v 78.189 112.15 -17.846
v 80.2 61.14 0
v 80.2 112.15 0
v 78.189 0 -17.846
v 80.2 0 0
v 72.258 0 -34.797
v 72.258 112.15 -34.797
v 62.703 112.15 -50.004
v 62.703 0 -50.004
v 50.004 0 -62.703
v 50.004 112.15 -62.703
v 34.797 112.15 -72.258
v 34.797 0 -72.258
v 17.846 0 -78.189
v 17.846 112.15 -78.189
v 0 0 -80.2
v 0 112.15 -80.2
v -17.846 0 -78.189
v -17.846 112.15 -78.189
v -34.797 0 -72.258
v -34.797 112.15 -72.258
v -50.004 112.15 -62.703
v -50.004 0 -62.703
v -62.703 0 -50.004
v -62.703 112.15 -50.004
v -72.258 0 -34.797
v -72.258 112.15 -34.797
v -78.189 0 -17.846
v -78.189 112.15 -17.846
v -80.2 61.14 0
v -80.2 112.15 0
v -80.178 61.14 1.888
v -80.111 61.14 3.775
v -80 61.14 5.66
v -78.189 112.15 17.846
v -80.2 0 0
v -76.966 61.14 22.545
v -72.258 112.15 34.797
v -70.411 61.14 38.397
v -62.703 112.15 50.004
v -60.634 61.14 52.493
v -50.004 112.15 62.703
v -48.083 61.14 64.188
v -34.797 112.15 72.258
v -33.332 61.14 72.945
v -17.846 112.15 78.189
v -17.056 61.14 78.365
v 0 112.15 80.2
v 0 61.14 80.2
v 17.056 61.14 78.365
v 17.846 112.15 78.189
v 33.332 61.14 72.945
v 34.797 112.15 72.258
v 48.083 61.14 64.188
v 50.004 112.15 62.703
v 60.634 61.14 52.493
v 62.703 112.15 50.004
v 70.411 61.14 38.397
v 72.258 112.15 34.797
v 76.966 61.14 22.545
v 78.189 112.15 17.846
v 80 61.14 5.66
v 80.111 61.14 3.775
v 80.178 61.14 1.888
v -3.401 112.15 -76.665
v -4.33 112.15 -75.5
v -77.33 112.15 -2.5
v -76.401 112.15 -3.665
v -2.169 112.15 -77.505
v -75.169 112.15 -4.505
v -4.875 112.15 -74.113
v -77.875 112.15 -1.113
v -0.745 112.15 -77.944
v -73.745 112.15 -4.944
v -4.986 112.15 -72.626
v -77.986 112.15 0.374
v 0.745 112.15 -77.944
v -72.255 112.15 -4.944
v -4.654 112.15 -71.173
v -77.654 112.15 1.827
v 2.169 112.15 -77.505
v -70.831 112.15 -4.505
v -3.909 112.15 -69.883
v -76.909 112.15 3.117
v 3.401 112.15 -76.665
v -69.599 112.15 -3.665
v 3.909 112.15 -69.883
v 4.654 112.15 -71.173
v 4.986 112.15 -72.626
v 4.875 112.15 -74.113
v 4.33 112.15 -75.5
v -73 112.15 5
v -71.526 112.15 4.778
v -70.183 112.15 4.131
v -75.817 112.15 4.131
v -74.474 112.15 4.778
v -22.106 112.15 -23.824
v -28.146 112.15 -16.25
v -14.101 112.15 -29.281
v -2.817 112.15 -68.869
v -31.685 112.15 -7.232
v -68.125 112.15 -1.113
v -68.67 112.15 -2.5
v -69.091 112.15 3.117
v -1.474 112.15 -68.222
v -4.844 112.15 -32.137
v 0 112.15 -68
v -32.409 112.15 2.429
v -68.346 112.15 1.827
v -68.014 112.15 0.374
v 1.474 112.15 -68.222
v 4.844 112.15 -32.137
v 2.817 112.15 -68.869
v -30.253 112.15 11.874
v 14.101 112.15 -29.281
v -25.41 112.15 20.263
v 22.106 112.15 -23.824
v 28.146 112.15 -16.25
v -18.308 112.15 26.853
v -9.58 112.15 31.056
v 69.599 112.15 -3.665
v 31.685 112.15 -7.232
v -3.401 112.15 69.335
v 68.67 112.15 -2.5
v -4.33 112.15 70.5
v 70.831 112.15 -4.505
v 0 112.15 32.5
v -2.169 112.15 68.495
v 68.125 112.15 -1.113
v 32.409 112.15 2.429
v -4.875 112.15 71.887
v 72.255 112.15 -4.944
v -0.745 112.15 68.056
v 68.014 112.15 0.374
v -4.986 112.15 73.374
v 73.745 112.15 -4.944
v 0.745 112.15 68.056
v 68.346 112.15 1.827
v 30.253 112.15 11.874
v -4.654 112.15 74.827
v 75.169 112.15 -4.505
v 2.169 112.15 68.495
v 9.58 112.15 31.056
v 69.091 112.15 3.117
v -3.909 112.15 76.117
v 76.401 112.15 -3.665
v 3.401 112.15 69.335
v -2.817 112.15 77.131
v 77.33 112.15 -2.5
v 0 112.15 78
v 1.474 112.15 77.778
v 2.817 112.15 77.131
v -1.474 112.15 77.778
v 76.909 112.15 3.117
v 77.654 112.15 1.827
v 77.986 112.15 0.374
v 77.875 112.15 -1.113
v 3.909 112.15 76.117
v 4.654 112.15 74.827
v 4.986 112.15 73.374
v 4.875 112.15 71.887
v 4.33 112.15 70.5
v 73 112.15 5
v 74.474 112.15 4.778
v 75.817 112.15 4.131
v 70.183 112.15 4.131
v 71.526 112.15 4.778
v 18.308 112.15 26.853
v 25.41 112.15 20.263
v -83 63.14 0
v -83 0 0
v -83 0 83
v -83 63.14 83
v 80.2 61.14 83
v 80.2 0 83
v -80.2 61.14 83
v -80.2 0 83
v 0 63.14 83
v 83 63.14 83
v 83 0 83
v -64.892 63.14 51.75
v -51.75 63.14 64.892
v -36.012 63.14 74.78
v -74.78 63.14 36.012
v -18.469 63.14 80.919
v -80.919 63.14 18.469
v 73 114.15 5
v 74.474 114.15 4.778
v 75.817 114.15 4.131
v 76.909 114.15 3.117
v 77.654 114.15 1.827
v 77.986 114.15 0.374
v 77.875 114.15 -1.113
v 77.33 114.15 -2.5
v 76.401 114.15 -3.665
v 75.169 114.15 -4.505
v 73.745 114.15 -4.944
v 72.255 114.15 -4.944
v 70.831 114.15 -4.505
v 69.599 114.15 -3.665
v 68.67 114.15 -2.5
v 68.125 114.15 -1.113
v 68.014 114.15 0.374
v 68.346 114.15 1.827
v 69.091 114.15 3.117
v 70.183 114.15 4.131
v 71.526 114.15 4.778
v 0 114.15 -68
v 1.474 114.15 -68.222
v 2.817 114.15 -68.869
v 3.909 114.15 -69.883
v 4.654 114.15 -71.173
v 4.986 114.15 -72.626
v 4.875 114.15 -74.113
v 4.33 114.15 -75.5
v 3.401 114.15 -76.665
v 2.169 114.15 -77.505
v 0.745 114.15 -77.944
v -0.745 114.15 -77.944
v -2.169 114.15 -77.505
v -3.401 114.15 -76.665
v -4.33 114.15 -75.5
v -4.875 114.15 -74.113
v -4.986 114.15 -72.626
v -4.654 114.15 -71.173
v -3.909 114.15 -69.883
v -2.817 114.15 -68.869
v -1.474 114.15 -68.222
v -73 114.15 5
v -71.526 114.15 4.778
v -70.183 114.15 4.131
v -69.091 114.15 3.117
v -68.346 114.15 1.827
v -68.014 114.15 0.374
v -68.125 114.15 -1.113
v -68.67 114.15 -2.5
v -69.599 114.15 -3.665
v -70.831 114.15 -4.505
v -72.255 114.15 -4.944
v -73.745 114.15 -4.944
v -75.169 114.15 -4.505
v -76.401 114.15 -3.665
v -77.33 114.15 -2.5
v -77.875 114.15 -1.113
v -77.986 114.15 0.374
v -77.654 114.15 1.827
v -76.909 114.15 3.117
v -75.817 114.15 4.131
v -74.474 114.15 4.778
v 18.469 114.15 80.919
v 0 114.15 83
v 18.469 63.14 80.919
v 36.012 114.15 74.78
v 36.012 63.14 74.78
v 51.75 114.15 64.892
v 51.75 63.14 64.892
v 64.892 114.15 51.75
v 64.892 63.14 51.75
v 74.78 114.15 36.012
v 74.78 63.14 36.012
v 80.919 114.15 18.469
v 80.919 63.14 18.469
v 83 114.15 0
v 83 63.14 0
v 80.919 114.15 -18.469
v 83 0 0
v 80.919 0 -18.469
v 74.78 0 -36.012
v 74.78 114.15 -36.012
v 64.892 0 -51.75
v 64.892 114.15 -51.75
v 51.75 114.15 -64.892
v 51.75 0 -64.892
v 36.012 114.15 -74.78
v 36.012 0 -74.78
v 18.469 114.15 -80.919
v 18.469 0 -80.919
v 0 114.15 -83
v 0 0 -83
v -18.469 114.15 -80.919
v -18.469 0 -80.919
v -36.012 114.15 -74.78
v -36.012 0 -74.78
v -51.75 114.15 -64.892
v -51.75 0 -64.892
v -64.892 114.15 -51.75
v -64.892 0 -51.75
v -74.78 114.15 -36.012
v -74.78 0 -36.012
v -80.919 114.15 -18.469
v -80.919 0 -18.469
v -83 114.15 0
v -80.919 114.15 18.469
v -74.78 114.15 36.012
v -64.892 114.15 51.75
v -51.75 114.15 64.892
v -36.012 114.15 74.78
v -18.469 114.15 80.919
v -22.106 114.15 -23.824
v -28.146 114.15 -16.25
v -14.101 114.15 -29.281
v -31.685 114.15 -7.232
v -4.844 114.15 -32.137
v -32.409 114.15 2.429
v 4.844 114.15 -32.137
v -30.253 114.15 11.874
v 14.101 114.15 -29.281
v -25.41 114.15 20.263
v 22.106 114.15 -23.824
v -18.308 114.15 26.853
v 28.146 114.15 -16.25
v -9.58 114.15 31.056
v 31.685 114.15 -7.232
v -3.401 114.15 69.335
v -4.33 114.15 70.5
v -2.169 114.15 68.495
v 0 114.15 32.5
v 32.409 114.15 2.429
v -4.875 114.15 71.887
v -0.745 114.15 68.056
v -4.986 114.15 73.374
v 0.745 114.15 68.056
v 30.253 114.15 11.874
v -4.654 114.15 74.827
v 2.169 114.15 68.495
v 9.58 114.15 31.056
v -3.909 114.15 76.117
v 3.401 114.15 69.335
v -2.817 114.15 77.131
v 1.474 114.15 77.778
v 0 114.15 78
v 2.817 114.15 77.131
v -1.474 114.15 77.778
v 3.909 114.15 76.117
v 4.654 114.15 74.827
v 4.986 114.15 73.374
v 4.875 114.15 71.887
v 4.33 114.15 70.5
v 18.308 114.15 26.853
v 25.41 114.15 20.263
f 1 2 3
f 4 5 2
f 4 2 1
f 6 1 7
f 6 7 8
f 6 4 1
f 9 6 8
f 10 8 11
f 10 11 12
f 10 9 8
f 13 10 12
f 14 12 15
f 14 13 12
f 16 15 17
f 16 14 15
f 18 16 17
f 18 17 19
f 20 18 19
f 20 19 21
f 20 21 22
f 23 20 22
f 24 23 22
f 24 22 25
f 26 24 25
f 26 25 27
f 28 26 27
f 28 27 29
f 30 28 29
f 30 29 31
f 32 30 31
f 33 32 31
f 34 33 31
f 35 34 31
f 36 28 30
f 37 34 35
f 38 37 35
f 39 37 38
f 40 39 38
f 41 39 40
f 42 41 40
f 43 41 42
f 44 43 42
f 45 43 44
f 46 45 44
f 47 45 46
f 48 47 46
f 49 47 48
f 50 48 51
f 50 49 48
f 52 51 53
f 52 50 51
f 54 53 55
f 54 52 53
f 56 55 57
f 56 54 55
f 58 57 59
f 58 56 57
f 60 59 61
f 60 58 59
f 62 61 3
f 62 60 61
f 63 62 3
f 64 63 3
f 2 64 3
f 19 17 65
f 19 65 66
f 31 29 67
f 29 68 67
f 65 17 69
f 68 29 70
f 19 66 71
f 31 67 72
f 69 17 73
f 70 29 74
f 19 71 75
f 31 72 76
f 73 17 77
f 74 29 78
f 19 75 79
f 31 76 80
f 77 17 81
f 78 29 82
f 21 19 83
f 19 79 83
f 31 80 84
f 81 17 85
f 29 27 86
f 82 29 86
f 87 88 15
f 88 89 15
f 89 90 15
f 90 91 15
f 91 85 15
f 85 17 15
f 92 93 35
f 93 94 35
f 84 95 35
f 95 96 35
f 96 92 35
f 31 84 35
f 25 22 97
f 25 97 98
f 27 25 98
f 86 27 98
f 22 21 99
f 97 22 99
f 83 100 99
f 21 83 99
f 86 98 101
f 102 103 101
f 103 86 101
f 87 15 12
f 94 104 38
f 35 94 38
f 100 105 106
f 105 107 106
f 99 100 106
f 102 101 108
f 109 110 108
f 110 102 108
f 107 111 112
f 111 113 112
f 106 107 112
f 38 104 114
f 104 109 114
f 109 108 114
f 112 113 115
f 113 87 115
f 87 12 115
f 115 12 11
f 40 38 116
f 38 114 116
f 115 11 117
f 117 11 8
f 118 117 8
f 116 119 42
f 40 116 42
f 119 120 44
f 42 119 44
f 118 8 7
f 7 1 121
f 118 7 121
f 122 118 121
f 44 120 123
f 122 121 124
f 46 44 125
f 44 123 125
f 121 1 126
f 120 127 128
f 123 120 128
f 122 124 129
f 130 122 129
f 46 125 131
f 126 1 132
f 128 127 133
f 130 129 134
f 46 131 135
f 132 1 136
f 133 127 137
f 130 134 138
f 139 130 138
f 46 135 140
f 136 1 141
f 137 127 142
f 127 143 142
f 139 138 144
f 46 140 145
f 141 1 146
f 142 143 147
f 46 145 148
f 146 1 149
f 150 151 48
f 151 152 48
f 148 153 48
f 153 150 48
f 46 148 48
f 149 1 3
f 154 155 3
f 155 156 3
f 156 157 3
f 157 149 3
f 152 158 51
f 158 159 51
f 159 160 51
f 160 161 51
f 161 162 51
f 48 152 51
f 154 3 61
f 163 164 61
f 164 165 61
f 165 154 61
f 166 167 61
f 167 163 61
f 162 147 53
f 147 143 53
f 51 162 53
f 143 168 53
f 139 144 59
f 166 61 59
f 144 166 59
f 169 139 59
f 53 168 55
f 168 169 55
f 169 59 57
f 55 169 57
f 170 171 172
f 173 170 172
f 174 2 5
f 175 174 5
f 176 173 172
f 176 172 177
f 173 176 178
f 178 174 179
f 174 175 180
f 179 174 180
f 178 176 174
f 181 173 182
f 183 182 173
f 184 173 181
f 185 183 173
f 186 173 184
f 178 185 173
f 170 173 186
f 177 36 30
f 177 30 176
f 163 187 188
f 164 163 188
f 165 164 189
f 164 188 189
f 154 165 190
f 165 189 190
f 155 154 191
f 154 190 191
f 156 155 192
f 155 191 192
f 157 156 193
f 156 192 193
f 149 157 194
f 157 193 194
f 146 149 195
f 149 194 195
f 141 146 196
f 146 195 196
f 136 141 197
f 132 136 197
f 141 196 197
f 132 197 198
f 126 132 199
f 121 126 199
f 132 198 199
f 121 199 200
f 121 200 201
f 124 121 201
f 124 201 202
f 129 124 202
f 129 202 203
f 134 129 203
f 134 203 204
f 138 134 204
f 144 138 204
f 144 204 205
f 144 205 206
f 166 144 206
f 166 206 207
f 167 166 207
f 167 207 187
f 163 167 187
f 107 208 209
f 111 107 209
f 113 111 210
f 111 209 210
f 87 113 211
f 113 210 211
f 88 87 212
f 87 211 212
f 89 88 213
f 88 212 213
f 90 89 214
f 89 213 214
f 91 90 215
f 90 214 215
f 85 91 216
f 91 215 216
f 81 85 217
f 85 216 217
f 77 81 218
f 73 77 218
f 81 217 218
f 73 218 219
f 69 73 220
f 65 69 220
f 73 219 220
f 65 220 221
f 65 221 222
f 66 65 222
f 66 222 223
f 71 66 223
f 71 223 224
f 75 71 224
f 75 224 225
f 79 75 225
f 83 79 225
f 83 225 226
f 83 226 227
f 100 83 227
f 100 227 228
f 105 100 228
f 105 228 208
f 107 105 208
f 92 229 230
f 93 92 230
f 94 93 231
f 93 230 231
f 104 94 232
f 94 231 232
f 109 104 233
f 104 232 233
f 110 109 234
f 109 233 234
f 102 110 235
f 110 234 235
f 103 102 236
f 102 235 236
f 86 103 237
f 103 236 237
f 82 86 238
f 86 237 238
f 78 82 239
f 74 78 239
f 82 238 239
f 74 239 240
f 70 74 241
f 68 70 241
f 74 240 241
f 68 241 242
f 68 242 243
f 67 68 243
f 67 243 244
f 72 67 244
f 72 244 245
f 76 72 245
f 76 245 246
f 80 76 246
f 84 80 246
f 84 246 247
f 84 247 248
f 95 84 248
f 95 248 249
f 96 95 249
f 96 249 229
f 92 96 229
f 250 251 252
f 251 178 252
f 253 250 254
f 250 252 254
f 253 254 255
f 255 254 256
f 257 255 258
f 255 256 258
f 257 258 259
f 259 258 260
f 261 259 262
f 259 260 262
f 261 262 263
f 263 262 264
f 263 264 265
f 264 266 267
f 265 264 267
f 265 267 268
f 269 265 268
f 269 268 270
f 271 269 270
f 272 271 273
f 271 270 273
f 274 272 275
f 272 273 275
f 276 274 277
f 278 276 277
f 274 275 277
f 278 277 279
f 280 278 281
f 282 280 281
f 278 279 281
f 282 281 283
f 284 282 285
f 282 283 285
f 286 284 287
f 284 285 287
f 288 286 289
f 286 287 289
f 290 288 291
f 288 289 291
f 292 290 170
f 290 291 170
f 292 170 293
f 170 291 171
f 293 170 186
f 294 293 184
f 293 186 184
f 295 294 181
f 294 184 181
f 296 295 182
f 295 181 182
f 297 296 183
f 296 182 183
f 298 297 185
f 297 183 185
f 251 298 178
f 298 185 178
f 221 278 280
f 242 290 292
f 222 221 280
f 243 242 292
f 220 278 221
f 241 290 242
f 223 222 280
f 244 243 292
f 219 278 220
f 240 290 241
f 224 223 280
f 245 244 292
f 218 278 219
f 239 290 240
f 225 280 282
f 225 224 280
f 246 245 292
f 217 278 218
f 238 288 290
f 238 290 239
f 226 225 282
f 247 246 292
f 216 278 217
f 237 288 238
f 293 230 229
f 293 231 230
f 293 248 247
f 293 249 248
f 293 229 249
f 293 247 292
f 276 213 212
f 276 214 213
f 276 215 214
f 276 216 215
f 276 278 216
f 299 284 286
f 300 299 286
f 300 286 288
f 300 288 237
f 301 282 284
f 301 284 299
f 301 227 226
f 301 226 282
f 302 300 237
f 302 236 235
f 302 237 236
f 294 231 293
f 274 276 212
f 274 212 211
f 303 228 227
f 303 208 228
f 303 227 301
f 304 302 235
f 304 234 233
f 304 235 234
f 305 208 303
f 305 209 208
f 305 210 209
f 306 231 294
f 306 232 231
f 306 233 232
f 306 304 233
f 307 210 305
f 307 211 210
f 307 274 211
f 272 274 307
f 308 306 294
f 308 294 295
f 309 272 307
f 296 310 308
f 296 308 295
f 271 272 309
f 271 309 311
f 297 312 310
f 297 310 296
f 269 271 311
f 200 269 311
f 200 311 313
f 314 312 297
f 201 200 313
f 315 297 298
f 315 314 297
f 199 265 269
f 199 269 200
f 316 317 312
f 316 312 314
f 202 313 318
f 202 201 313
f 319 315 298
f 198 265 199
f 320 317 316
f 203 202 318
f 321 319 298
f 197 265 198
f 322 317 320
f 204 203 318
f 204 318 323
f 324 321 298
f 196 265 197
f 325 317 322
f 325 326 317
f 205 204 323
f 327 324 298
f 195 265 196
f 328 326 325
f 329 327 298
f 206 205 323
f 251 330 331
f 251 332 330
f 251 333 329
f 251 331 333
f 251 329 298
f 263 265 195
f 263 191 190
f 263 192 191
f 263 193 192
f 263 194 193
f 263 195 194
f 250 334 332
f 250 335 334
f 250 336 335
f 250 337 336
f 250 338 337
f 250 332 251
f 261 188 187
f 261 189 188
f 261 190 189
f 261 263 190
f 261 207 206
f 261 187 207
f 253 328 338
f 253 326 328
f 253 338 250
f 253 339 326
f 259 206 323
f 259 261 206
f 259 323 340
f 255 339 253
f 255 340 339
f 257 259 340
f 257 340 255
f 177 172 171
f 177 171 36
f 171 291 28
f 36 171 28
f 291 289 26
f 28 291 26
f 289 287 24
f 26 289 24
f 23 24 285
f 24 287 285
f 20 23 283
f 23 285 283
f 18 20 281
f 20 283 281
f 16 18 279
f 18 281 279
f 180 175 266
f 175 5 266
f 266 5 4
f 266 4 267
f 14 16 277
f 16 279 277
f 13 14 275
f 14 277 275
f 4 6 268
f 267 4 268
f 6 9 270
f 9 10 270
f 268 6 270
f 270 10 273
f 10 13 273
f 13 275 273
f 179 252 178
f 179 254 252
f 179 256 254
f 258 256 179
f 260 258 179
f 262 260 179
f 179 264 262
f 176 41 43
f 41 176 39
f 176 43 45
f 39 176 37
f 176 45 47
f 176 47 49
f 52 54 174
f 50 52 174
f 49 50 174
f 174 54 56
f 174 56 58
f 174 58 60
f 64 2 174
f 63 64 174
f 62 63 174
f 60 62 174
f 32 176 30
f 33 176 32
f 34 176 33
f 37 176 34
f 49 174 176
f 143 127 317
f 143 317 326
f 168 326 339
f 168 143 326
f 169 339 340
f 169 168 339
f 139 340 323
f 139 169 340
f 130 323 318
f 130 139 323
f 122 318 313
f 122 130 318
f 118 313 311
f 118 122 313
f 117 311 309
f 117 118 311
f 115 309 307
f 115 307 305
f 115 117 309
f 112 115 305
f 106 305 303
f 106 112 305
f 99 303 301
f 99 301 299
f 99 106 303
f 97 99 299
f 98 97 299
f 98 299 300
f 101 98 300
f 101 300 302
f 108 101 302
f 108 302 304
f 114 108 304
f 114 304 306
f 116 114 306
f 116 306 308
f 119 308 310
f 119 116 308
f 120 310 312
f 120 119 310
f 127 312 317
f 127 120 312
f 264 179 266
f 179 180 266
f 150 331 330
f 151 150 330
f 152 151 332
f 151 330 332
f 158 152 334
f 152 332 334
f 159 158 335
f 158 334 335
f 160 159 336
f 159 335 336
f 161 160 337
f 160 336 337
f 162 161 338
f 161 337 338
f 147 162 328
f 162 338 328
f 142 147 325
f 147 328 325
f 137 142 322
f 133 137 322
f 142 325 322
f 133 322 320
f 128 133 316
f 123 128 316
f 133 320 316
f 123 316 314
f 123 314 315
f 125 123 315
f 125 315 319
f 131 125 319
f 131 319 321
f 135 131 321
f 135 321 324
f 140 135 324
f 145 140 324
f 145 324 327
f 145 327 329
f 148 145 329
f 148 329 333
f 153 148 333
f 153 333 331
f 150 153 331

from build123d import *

# Parameters (mm, degrees)
BOSS_EXTRUDE1_DEPTH      = 61.14
SKETCH2_R                = 80
BOSS_EXTRUDE2_DEPTH      = 2
SKETCH3_R                = 83
SKETCH3_R_2              = 80
BOSS_EXTRUDE3_DEPTH      = 49.01
SKETCH6_R                = 83
SKETCH6_R_2              = 32.5
BOSS_EXTRUDE4_DEPTH      = 2
MOVE_START               = -80.2
MOVE_FACE1_OUTLINE_W     = 61.14
MOVE_FACE1_OUTLINE_H     = 0.2
MOVE_FACE1_DEPTH         = 160.4
MOVE_FACE1_2_OUTLINE_R   = 80.2
MOVE_FACE1_2_OUTLINE_R_2 = 80
MOVE_FACE1_2_DEPTH       = 112.15
MOVE_FACE1_3_DEPTH       = 61.14
SKETCH7_R                = 5
CUT_EXTRUDE1_DEPTH       = 164.732166968
CUT_EXTRUDE2_DEPTH       = 216.762514121


with BuildPart() as part:
    # Sketch1 → Boss-Extrude1 (new body)
    with BuildSketch(Plane(origin=(0, 0, 0), x_dir=(1, 0, 0), z_dir=(0, 1, 0))):
        with BuildLine():
            Line((0, -83), (83, -83))
            Line((83, -83), (83, 0))
            ThreePointArc((83, 0), (0, 83), (-83, 0))
            Line((-83, 0), (-83, -83))
            Line((-83, -83), (0, -83))
        make_face()
        with BuildLine():
            Line((-80, 0), (-80, -80))
            Line((-80, -80), (0, -80))
            Line((0, -80), (80, -80))
            Line((80, -80), (80, 0))
            ThreePointArc((80, 0), (0, 80), (-80, 0))
        make_face(mode=Mode.SUBTRACT)
    extrude(amount=BOSS_EXTRUDE1_DEPTH)

    # Sketch2 → Boss-Extrude2 (add)
    with BuildSketch(Plane(origin=(0, 61.14, 0), x_dir=(1, 0, 0), z_dir=(0, 1, 0))):
        with BuildLine():
            Line((-83, -83), (83, -83))
            Line((83, -83), (83, 0))
            ThreePointArc((83, 0), (0, 83), (-83, 0))
            Line((-83, 0), (-83, -83))
        make_face()
        with Locations(Location((0, 0, 0), (0, 0, 270))):
            Circle(SKETCH2_R, mode=Mode.SUBTRACT)
    extrude(amount=BOSS_EXTRUDE2_DEPTH)

    # Sketch3 → Boss-Extrude3 (add)
    with BuildSketch(Plane(origin=(0, 63.14, 0), x_dir=(1, 0, 0), z_dir=(0, 1, 0))):
        with Locations(Location((0, 0, 0), (0, 0, 270))):
            Circle(SKETCH3_R)
        with Locations(Location((0, 0, 0), (0, 0, 270))):
            Circle(SKETCH3_R_2, mode=Mode.SUBTRACT)
    extrude(amount=BOSS_EXTRUDE3_DEPTH)

    # Sketch6 → Boss-Extrude4 (add)
    with BuildSketch(Plane(origin=(0, 112.15, 0), x_dir=(1, 0, 0), z_dir=(0, 1, 0))):
        with Locations(Location((0, 0, 0), (0, 0, 270))):
            Circle(SKETCH6_R)
        with Locations(Location((0, 0, 0), (0, 0, 270))):
            Circle(SKETCH6_R_2, mode=Mode.SUBTRACT)
    extrude(amount=BOSS_EXTRUDE4_DEPTH)

    # Move Face1: read off the stored shape, not the designer's step
    # Move Face1 outline → Move Face1 (cut)
    with BuildSketch(Plane.YZ.offset(MOVE_START)):
        with Locations((30.57, 80.1)):
            Rectangle(MOVE_FACE1_OUTLINE_W, MOVE_FACE1_OUTLINE_H)
    extrude(amount=MOVE_FACE1_DEPTH, mode=Mode.SUBTRACT)

    # Move Face1 2 outline → Move Face1 2 (cut)
    with BuildSketch(Plane(origin=(0, 0, 0), x_dir=(1, 0, 0), z_dir=(0, 1, 0))):
        Circle(MOVE_FACE1_2_OUTLINE_R)
        Circle(MOVE_FACE1_2_OUTLINE_R_2, mode=Mode.SUBTRACT)
    extrude(amount=MOVE_FACE1_2_DEPTH, mode=Mode.SUBTRACT)

    # Move Face1 3 outline → Move Face1 3 (cut)
    with BuildSketch(Plane(origin=(0, 0, 0), x_dir=(1, 0, 0), z_dir=(0, 1, 0))):
        with BuildLine():
            Line((80.2, -80), (80.2, 0))
            ThreePointArc((80.2, 0), (80.149984404, -2.831960452), (80, -5.660388679))
            Line((80, -5.660388679), (80, -80))
            Line((80, -80), (80.2, -80))
        make_face()
        with BuildLine():
            ThreePointArc((-80, -5.660388679), (-80.149984404, -2.831960452), (-80.2, 0))
            Line((-80.2, 0), (-80.2, -80))
            Line((-80.2, -80), (-80, -80))
            Line((-80, -80), (-80, -5.660388679))
        make_face()
    extrude(amount=MOVE_FACE1_3_DEPTH, mode=Mode.SUBTRACT)

    # Sketch7 → Cut-Extrude1 (cut, through all)
    with BuildSketch(Plane(origin=(0, 114.15, 0), x_dir=(1, 0, 0), z_dir=(0, 1, 0))):
        with Locations(Location((0, 73, 0), (0, 0, 270))):
            Circle(SKETCH7_R)
        with Locations(Location((73, 0, 0), (0, 0, 270))):
            Circle(SKETCH7_R)
        with Locations(Location((0, -73, 0), (0, 0, 270))):
            Circle(SKETCH7_R)
        with Locations(Location((-73, 0, 0), (0, 0, 270))):
            Circle(SKETCH7_R)
    extrude(amount=-CUT_EXTRUDE1_DEPTH, mode=Mode.SUBTRACT)

    # Sketch8 → Cut-Extrude2 (cut, through all)
    with BuildSketch(Plane(origin=(0, 0, 80.2), x_dir=(-1, 0, 0), z_dir=(0, 0, -1))):
        Polygon((-80.2, 0), (80.2, 0), (80.2, 61.14), (0, 61.14), (-80.2, 61.14), align=None)
    extrude(amount=-CUT_EXTRUDE2_DEPTH, mode=Mode.SUBTRACT)


solid = part.part
